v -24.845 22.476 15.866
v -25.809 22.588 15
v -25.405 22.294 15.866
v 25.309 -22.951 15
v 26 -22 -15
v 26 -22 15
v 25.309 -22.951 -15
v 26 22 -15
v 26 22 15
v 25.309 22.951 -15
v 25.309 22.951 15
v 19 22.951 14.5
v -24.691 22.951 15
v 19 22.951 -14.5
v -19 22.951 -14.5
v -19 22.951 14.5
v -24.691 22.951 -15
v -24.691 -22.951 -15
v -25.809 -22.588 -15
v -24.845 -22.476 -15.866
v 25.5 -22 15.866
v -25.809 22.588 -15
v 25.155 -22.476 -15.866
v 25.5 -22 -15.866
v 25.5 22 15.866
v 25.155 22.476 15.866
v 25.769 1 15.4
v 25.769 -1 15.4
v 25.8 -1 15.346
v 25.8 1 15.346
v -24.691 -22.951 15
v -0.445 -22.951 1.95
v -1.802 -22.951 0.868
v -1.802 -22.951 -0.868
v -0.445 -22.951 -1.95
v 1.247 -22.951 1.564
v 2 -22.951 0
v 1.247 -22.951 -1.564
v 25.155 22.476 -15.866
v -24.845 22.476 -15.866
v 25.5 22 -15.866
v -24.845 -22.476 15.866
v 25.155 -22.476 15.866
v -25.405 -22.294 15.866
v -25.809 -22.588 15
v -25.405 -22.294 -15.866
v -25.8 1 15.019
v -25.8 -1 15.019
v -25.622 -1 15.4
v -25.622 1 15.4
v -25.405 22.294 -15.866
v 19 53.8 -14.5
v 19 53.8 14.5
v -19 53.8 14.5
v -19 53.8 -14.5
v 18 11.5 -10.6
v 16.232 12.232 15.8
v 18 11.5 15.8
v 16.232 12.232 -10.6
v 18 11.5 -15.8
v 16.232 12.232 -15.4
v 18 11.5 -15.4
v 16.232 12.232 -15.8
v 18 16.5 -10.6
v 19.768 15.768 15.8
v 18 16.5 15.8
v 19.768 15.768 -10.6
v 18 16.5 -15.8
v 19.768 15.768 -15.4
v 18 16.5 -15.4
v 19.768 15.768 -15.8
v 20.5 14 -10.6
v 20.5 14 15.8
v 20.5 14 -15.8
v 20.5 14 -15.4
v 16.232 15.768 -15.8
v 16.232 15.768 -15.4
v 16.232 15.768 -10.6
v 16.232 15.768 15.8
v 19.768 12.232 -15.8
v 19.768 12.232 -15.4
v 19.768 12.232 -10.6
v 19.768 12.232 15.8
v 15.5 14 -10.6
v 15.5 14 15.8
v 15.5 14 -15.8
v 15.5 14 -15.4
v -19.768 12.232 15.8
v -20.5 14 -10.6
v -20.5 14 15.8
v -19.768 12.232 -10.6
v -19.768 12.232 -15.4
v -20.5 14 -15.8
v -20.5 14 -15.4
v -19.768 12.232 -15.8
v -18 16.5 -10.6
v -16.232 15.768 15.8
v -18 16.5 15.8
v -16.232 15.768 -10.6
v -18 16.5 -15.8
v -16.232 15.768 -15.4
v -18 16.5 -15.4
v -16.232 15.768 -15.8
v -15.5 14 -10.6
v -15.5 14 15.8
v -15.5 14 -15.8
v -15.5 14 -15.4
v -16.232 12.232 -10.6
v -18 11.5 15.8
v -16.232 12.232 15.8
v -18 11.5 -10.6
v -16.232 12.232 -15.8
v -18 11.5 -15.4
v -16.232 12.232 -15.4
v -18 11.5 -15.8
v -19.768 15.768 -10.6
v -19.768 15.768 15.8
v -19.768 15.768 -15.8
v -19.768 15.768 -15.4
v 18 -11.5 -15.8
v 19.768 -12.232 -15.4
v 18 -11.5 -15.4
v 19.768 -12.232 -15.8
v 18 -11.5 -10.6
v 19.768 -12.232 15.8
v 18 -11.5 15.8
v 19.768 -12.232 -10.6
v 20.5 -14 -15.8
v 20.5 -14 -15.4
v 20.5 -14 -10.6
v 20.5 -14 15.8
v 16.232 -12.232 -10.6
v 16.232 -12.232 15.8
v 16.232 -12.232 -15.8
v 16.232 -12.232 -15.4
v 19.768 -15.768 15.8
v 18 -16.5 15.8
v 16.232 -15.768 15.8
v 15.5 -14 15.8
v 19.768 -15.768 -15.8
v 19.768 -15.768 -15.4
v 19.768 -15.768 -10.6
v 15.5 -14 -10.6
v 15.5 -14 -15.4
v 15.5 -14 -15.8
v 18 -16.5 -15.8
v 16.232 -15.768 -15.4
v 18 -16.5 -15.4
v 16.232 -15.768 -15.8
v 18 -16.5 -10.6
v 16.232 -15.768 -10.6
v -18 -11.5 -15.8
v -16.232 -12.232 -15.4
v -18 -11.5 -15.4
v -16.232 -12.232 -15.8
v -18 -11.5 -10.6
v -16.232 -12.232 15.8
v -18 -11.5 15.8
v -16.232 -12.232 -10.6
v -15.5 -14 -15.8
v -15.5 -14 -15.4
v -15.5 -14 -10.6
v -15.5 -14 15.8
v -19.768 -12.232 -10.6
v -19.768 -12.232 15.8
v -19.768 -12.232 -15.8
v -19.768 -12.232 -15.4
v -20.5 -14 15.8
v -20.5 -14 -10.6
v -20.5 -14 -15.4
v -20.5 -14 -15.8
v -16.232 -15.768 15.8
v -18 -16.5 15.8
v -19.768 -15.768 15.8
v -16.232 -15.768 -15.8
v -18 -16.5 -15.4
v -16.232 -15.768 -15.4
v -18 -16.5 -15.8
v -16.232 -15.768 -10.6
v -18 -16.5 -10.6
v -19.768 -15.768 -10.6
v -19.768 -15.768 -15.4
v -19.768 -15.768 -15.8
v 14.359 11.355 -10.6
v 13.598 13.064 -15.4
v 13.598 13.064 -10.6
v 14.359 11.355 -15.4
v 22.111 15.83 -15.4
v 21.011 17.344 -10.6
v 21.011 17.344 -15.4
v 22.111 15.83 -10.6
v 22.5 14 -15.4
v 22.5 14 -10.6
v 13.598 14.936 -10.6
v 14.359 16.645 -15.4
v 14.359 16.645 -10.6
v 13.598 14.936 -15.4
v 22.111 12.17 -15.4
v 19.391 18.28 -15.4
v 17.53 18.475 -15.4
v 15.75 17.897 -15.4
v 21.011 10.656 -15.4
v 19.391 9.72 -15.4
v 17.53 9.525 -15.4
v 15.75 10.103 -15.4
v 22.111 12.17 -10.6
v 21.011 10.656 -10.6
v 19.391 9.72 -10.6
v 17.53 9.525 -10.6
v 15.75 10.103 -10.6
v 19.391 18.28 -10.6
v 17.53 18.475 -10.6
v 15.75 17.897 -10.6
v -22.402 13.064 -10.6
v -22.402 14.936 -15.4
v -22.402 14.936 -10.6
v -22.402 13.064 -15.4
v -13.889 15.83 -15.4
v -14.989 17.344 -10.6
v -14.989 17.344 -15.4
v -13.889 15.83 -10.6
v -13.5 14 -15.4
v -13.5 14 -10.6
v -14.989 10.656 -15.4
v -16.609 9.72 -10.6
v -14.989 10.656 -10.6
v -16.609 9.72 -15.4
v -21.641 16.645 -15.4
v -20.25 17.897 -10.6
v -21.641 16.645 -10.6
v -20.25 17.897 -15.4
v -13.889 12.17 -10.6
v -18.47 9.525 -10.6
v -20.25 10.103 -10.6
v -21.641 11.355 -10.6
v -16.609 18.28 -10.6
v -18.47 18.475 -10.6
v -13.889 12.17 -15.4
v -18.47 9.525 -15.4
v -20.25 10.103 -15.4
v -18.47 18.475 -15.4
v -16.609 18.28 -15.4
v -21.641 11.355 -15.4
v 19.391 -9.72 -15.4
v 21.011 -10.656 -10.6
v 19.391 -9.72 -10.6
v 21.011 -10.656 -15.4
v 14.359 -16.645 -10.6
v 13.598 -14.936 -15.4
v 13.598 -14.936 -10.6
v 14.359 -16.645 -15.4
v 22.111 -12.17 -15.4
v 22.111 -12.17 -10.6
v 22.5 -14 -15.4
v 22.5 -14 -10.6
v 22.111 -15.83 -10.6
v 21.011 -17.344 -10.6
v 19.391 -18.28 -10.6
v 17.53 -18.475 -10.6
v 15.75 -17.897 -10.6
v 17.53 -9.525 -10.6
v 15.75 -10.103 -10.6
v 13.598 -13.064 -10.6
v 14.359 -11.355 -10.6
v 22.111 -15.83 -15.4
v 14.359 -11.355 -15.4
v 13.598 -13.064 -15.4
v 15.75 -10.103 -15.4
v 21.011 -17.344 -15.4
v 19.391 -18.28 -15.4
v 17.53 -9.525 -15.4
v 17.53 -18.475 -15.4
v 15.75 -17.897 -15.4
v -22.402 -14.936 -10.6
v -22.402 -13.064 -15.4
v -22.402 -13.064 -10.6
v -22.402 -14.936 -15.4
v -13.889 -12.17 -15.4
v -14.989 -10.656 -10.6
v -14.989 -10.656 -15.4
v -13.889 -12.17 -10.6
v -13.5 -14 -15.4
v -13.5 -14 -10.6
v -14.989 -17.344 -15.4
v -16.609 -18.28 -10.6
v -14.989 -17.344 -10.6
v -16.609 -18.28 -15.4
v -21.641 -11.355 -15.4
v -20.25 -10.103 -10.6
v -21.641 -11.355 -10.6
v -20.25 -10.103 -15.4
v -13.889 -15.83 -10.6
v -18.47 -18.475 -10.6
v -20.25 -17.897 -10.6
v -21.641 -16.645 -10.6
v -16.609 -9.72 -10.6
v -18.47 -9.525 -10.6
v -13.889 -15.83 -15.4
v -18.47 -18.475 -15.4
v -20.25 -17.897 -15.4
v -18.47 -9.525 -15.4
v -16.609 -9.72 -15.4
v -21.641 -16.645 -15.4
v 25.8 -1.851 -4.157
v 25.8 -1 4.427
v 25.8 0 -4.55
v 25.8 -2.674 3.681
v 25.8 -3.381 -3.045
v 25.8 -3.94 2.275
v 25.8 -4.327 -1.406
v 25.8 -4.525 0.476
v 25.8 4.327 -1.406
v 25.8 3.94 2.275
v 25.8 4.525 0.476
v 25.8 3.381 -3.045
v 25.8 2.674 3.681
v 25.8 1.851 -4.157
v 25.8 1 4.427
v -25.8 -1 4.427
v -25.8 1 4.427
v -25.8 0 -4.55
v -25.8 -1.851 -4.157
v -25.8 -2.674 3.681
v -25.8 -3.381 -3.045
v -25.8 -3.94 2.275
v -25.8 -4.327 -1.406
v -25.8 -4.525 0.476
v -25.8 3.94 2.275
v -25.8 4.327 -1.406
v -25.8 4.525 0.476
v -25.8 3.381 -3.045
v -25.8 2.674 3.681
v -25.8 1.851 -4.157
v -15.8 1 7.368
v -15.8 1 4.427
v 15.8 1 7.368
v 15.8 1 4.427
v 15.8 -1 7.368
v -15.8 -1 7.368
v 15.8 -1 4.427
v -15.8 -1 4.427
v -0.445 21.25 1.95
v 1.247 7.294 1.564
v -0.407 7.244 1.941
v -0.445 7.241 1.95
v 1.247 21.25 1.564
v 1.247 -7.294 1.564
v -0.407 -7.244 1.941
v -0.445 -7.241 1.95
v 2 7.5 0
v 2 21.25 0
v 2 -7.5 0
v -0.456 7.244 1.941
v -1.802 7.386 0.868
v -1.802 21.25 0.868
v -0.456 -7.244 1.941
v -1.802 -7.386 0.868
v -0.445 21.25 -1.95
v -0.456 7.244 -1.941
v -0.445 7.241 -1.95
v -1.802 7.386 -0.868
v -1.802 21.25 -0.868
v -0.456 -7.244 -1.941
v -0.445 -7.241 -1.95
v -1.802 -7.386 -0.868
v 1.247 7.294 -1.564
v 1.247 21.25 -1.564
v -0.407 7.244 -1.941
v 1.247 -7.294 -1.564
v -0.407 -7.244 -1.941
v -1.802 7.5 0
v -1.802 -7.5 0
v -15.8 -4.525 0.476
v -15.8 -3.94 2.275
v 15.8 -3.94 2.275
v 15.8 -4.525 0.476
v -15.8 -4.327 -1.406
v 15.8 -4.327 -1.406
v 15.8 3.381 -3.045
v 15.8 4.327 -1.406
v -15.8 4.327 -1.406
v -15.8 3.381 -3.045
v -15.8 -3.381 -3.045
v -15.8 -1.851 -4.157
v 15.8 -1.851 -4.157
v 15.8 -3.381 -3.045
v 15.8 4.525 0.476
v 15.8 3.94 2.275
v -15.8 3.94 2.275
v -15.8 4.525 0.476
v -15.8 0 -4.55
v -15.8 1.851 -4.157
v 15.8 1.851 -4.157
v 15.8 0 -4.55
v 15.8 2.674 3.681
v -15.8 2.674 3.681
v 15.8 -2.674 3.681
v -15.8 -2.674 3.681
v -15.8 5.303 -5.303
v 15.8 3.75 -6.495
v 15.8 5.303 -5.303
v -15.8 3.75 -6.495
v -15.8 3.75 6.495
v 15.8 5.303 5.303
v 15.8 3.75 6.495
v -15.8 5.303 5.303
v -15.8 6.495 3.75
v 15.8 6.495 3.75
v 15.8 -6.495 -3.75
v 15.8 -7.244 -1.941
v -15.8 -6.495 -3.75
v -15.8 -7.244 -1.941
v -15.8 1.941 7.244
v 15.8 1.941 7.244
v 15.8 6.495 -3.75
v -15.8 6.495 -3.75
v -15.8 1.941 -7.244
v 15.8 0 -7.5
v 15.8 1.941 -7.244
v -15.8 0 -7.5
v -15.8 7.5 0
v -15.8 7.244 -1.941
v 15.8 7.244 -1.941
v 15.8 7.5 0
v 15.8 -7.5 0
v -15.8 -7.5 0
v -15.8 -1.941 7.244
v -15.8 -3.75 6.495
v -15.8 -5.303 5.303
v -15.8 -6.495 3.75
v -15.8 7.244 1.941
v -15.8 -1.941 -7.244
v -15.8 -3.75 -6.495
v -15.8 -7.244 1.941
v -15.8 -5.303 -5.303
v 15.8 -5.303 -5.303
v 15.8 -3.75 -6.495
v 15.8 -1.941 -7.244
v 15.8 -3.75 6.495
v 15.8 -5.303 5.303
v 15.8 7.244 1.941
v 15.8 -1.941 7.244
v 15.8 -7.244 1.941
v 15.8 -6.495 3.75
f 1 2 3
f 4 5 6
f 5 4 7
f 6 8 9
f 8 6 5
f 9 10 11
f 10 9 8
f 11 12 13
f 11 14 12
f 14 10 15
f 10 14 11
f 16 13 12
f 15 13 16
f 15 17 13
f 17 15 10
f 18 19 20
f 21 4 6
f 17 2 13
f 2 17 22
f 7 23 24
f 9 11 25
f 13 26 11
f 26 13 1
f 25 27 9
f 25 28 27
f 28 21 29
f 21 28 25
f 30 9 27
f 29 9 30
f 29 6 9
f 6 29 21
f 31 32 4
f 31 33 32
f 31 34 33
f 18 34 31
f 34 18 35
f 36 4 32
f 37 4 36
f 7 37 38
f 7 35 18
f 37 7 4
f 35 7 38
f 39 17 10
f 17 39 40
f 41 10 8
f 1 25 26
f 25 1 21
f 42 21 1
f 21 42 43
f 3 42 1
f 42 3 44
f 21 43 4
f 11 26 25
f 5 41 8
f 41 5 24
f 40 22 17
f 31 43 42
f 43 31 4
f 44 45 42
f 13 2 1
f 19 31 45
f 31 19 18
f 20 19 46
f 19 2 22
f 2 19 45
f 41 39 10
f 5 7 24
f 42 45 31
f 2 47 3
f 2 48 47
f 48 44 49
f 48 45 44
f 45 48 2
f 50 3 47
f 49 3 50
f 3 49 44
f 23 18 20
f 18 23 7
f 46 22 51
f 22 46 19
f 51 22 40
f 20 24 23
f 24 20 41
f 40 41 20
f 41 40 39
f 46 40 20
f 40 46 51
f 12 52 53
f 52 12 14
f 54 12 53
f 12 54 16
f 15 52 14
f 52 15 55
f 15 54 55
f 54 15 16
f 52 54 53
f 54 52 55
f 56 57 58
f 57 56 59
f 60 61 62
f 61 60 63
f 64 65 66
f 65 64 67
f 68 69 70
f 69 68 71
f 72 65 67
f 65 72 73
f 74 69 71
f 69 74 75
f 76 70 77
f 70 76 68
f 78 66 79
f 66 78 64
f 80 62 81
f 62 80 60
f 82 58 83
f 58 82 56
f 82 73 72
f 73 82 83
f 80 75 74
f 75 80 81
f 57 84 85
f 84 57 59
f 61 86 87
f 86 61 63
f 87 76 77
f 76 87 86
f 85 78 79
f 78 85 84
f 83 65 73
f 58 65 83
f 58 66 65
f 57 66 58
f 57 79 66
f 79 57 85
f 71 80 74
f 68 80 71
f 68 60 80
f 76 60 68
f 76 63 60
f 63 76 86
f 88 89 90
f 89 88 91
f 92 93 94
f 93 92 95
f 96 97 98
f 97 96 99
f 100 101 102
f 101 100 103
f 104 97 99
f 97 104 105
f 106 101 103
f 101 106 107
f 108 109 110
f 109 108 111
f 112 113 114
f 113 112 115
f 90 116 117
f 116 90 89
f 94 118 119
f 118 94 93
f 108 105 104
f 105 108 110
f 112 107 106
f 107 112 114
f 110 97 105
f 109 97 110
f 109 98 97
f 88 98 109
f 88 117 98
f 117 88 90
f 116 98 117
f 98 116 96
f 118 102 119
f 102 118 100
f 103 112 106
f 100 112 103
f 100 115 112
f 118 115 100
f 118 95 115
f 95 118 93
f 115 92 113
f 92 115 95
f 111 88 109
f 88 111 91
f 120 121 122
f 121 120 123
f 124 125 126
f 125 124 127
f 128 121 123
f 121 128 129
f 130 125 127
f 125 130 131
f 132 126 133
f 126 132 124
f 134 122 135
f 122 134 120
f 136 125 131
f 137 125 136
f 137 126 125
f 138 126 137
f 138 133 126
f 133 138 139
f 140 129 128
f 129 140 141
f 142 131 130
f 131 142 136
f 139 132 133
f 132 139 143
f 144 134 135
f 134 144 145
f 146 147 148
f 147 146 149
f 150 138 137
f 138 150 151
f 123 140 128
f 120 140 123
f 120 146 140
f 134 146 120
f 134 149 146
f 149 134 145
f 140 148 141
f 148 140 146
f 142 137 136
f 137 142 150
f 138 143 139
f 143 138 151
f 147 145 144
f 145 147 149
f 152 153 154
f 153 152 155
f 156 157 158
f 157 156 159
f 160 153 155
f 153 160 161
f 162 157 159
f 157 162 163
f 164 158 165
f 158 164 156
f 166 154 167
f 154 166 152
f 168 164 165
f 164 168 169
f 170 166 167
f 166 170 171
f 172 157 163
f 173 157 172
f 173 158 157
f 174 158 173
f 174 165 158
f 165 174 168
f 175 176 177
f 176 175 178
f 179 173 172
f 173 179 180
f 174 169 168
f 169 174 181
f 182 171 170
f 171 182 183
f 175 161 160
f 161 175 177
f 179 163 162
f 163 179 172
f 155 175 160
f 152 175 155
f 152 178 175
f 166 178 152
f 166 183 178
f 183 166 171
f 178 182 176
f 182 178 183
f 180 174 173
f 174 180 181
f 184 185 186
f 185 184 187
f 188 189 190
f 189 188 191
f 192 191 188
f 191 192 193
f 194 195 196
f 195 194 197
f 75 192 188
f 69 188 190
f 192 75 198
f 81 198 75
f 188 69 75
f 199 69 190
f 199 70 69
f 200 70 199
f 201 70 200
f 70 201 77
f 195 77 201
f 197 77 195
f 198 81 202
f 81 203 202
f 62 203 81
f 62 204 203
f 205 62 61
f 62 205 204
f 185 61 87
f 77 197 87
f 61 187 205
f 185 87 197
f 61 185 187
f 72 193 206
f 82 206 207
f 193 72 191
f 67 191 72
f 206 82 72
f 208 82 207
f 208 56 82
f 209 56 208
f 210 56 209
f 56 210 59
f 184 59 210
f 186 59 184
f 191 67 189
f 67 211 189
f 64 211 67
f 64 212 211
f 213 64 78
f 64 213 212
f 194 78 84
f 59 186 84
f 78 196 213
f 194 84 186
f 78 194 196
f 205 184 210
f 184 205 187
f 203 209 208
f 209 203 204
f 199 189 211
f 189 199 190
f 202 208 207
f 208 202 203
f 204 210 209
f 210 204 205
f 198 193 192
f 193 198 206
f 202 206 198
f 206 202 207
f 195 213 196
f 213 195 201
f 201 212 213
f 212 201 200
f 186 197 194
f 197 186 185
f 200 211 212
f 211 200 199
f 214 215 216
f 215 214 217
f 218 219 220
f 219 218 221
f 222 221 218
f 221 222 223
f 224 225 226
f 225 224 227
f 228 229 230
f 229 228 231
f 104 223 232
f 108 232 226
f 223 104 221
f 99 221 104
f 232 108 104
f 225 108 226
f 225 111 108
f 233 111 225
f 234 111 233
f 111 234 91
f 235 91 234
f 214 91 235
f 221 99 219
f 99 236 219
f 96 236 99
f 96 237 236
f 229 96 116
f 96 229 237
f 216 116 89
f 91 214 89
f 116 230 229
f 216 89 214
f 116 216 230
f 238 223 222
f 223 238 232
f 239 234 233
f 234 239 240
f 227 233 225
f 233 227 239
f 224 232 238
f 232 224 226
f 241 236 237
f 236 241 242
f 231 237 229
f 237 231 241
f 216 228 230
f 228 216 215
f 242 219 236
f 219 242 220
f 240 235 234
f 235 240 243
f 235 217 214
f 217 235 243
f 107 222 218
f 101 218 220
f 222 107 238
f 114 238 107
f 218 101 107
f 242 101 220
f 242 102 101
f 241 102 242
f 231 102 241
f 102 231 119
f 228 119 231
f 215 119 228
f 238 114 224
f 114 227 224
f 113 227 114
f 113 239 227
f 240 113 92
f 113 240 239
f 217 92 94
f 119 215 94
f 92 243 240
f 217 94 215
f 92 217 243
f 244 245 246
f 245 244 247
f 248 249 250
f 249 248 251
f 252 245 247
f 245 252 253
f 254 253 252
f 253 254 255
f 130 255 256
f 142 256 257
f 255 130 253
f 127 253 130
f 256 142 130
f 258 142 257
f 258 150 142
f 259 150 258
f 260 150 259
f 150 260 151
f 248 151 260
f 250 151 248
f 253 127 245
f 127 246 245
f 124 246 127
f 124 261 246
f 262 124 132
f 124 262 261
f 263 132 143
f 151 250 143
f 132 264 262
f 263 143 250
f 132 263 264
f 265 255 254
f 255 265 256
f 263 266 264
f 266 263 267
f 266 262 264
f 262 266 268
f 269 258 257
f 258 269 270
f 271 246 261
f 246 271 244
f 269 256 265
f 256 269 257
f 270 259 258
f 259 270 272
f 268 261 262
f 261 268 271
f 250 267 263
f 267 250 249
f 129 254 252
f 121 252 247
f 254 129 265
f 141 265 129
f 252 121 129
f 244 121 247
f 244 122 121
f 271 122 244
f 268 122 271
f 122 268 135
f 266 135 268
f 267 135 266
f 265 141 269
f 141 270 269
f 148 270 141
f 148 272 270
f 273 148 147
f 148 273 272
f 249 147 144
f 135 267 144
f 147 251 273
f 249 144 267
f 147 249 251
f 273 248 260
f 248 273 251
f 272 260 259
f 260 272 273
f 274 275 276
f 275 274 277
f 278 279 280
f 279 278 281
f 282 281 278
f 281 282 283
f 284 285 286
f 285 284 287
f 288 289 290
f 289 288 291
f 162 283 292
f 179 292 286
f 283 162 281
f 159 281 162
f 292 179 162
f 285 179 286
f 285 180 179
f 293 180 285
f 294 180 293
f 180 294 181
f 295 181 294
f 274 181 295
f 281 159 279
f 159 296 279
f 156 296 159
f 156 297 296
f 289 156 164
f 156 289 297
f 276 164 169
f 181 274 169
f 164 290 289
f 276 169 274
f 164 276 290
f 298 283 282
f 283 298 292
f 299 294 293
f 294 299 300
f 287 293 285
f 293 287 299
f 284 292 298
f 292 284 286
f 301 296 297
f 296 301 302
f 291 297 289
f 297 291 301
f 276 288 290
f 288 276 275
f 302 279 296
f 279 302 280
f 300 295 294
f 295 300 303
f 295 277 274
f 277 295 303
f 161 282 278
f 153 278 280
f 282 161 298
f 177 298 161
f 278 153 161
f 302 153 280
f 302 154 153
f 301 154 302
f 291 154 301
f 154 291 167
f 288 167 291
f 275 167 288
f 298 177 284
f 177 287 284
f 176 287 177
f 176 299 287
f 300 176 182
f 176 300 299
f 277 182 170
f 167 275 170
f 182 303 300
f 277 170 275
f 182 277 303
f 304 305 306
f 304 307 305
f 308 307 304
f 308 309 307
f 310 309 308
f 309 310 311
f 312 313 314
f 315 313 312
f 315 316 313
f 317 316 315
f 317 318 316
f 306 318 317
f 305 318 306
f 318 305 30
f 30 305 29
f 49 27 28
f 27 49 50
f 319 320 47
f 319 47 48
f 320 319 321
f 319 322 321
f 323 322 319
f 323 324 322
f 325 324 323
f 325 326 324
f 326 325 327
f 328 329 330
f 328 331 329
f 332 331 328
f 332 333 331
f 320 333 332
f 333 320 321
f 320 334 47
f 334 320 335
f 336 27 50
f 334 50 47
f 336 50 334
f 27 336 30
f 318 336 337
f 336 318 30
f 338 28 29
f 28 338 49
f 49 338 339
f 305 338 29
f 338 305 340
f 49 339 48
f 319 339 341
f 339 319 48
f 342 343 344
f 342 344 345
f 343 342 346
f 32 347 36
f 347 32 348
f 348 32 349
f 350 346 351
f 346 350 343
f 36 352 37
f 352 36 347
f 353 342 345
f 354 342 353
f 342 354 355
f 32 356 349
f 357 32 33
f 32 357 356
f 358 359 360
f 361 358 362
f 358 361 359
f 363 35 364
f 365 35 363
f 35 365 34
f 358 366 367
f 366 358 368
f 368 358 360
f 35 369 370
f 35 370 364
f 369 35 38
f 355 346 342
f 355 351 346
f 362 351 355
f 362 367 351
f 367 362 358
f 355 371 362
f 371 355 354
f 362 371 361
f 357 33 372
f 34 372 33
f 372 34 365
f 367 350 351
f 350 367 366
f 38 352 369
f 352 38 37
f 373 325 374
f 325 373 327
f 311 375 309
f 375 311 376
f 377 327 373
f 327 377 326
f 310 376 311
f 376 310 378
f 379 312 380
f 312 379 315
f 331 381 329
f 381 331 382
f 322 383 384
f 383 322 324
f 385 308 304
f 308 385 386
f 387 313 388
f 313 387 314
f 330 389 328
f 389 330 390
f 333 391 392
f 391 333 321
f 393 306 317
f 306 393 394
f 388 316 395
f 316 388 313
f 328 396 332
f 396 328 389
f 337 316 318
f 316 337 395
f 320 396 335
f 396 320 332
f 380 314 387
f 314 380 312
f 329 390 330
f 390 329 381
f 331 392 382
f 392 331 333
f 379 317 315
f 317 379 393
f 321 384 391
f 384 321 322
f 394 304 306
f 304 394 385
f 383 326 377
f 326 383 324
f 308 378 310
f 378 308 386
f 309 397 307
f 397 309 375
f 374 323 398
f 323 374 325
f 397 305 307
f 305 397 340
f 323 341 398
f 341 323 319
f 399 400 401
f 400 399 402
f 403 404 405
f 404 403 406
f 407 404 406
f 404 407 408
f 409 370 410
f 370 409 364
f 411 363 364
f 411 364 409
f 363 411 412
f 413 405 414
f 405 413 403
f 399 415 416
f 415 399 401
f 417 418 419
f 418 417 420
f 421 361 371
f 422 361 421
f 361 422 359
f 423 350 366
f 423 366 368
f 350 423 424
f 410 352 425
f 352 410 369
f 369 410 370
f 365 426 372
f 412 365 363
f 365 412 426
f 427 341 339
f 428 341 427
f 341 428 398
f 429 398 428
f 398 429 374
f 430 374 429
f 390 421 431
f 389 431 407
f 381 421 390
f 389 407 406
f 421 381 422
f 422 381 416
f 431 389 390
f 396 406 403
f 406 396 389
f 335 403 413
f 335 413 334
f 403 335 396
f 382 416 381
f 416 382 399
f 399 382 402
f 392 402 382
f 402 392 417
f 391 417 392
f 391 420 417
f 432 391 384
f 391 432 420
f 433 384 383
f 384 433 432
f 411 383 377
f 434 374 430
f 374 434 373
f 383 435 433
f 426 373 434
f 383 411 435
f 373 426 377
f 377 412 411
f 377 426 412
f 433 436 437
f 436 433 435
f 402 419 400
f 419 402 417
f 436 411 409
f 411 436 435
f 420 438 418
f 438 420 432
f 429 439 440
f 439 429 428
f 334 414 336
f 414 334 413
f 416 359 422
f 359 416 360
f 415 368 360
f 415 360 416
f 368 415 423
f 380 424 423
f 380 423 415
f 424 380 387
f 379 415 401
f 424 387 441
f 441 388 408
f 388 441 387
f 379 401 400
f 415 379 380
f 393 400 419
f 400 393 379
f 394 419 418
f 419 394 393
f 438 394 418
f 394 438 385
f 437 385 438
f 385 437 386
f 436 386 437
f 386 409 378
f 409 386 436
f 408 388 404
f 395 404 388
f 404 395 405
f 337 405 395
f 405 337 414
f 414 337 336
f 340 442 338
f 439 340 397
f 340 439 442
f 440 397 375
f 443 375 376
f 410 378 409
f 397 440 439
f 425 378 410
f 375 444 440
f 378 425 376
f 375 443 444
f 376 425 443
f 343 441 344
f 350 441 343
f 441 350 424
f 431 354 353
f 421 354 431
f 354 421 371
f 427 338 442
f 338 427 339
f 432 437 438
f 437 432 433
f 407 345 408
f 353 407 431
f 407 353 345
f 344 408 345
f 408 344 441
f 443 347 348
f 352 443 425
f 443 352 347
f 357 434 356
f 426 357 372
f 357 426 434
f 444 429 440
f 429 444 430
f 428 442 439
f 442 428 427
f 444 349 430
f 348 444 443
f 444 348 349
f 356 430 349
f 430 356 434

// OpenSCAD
// Parameters
shaft_diameter = 9.0; //[4.5:18.0:0.1]
block_length = 50.0; //[25.0:100.0:0.5]
block_width = 44.0; //[22.0:88.0:0.5]
block_height = 30.0; //[15.0:60.0:0.5]
bearing_outer_diameter = 15.0; //[10.0:30.0:0.1]
bearing_length = 30.0; //[15.0:60.0:0.5]
bore_clearance = 0.1; //[0.0:0.5:0.05]
mount_hole_diameter = 5.0; //[3.0:8.0:0.1]
mount_hole_spacing_x = 36.0; //[18.0:72.0:0.5]
mount_hole_spacing_y = 28.0; //[14.0:56.0:0.5]
counterbore_diameter = 9.0; //[6.0:16.0:0.1]
counterbore_depth = 4.0; //[2.0:10.0:0.1]
clamp_screw_diameter = 4.0; //[3.0:8.0:0.1]
clamp_gap_width = 2.0; //[1.0:6.0:0.1]
clamp_gap_depth = 18.0; //[8.0:40.0:0.5]
edge_fillet_radius = 1.0; //[0.5:3.0:0.1]
eps = 0.8; //[0.5:2.0:0.1]

// Connectivity overlap (1-2mm) for guaranteed physical connection
overlap = 1.2;

// Base shapes
module block_body_raw() {
  cube([block_length, block_width, block_height], center=true);
}

module edge_fillet_sphere() {
  sphere(r=edge_fillet_radius);
}

module shaft_bore() {
  rotate([0, 90, 0])
    cylinder(r=(shaft_diameter + bore_clearance)/2, h=block_length + 2*eps, center=true);
}

module bearing_seat() {
  rotate([0, 90, 0])
    cylinder(r=bearing_outer_diameter/2, h=bearing_length + 2*eps, center=true);
}

module mount_hole_through() {
  cylinder(r=mount_hole_diameter/2, h=block_height + 2*eps, center=true);
}

module mount_hole_counterbore() {
  // Counterbore from bottom face upward
  translate([0, 0, -block_height/2 + counterbore_depth/2])
    cylinder(r=counterbore_diameter/2, h=counterbore_depth + eps, center=true);
}

module clamp_gap_slot() {
  // Slot from top face downward
  translate([0, 0, block_height/2 - (clamp_gap_depth/2)])
    cube([block_length + 2*eps, clamp_gap_width, clamp_gap_depth + eps], center=true);
}

module clamp_screw_hole() {
  // Cross hole through width (Y), positioned near the clamp region
  rotate([90, 0, 0])
    translate([0, 0, block_height/2 - clamp_gap_depth + (shaft_diameter + bore_clearance)/2])
      cylinder(r=clamp_screw_diameter/2, h=block_width + 2*eps, center=true);
}

// Operations
module mounting_holes_pattern() {
  union() {
    translate([ mount_hole_spacing_x/2,  mount_hole_spacing_y/2, 0]) mount_hole_through();
    translate([-mount_hole_spacing_x/2,  mount_hole_spacing_y/2, 0]) mount_hole_through();
    translate([ mount_hole_spacing_x/2, -mount_hole_spacing_y/2, 0]) mount_hole_through();
    translate([-mount_hole_spacing_x/2, -mount_hole_spacing_y/2, 0]) mount_hole_through();
  }
}

module mounting_hole_counterbore_or_countersink() {
  union() {
    translate([ mount_hole_spacing_x/2,  mount_hole_spacing_y/2, 0]) mount_hole_counterbore();
    translate([-mount_hole_spacing_x/2,  mount_hole_spacing_y/2, 0]) mount_hole_counterbore();
    translate([ mount_hole_spacing_x/2, -mount_hole_spacing_y/2, 0]) mount_hole_counterbore();
    translate([-mount_hole_spacing_x/2, -mount_hole_spacing_y/2, 0]) mount_hole_counterbore();
  }
}

module split_clamp_or_retention_feature() {
  union() {
    clamp_gap_slot();
    clamp_screw_hole();
  }
}

// MISSING PART ADDED: bearing block (external bearing housing/boss)
// This is a solid boss around the bearing seat, attached to the main body with overlap.
module bearing_block_boss() {
  // Boss dimensions (kept modest to avoid changing overall design too much)
  boss_len = bearing_length + 8;                 // along X
  boss_w   = min(block_width, bearing_outer_diameter + 18); // along Y
  boss_h   = min(block_height, bearing_outer_diameter + 14);// along Z

  // Place on the +Y side, intersecting the main body by 'overlap'
  y_pos = (block_width/2) + (boss_w/2) - overlap;

  translate([0, y_pos, 0])
    cube([boss_len, boss_w, boss_h], center=true);
}

module block_body() {
  // Union of all solids (bearing block boss + main body), then subtract features
  difference() {
    union() {
      // Main body with filleted edges
      minkowski() {
        block_body_raw();
        edge_fillet_sphere();
      }

      // Added bearing block (boss) physically connected with overlap
      bearing_block_boss();
    }

    // Subtractive features (apply to both main body and boss)
    shaft_bore();
    bearing_seat();
    mounting_holes_pattern();
    mounting_hole_counterbore_or_countersink();
    split_clamp_or_retention_feature();
  }
}

// Final single solid output (no duplicate bodies / no floating "hole position" geometry)
union() {
  block_body();
}
